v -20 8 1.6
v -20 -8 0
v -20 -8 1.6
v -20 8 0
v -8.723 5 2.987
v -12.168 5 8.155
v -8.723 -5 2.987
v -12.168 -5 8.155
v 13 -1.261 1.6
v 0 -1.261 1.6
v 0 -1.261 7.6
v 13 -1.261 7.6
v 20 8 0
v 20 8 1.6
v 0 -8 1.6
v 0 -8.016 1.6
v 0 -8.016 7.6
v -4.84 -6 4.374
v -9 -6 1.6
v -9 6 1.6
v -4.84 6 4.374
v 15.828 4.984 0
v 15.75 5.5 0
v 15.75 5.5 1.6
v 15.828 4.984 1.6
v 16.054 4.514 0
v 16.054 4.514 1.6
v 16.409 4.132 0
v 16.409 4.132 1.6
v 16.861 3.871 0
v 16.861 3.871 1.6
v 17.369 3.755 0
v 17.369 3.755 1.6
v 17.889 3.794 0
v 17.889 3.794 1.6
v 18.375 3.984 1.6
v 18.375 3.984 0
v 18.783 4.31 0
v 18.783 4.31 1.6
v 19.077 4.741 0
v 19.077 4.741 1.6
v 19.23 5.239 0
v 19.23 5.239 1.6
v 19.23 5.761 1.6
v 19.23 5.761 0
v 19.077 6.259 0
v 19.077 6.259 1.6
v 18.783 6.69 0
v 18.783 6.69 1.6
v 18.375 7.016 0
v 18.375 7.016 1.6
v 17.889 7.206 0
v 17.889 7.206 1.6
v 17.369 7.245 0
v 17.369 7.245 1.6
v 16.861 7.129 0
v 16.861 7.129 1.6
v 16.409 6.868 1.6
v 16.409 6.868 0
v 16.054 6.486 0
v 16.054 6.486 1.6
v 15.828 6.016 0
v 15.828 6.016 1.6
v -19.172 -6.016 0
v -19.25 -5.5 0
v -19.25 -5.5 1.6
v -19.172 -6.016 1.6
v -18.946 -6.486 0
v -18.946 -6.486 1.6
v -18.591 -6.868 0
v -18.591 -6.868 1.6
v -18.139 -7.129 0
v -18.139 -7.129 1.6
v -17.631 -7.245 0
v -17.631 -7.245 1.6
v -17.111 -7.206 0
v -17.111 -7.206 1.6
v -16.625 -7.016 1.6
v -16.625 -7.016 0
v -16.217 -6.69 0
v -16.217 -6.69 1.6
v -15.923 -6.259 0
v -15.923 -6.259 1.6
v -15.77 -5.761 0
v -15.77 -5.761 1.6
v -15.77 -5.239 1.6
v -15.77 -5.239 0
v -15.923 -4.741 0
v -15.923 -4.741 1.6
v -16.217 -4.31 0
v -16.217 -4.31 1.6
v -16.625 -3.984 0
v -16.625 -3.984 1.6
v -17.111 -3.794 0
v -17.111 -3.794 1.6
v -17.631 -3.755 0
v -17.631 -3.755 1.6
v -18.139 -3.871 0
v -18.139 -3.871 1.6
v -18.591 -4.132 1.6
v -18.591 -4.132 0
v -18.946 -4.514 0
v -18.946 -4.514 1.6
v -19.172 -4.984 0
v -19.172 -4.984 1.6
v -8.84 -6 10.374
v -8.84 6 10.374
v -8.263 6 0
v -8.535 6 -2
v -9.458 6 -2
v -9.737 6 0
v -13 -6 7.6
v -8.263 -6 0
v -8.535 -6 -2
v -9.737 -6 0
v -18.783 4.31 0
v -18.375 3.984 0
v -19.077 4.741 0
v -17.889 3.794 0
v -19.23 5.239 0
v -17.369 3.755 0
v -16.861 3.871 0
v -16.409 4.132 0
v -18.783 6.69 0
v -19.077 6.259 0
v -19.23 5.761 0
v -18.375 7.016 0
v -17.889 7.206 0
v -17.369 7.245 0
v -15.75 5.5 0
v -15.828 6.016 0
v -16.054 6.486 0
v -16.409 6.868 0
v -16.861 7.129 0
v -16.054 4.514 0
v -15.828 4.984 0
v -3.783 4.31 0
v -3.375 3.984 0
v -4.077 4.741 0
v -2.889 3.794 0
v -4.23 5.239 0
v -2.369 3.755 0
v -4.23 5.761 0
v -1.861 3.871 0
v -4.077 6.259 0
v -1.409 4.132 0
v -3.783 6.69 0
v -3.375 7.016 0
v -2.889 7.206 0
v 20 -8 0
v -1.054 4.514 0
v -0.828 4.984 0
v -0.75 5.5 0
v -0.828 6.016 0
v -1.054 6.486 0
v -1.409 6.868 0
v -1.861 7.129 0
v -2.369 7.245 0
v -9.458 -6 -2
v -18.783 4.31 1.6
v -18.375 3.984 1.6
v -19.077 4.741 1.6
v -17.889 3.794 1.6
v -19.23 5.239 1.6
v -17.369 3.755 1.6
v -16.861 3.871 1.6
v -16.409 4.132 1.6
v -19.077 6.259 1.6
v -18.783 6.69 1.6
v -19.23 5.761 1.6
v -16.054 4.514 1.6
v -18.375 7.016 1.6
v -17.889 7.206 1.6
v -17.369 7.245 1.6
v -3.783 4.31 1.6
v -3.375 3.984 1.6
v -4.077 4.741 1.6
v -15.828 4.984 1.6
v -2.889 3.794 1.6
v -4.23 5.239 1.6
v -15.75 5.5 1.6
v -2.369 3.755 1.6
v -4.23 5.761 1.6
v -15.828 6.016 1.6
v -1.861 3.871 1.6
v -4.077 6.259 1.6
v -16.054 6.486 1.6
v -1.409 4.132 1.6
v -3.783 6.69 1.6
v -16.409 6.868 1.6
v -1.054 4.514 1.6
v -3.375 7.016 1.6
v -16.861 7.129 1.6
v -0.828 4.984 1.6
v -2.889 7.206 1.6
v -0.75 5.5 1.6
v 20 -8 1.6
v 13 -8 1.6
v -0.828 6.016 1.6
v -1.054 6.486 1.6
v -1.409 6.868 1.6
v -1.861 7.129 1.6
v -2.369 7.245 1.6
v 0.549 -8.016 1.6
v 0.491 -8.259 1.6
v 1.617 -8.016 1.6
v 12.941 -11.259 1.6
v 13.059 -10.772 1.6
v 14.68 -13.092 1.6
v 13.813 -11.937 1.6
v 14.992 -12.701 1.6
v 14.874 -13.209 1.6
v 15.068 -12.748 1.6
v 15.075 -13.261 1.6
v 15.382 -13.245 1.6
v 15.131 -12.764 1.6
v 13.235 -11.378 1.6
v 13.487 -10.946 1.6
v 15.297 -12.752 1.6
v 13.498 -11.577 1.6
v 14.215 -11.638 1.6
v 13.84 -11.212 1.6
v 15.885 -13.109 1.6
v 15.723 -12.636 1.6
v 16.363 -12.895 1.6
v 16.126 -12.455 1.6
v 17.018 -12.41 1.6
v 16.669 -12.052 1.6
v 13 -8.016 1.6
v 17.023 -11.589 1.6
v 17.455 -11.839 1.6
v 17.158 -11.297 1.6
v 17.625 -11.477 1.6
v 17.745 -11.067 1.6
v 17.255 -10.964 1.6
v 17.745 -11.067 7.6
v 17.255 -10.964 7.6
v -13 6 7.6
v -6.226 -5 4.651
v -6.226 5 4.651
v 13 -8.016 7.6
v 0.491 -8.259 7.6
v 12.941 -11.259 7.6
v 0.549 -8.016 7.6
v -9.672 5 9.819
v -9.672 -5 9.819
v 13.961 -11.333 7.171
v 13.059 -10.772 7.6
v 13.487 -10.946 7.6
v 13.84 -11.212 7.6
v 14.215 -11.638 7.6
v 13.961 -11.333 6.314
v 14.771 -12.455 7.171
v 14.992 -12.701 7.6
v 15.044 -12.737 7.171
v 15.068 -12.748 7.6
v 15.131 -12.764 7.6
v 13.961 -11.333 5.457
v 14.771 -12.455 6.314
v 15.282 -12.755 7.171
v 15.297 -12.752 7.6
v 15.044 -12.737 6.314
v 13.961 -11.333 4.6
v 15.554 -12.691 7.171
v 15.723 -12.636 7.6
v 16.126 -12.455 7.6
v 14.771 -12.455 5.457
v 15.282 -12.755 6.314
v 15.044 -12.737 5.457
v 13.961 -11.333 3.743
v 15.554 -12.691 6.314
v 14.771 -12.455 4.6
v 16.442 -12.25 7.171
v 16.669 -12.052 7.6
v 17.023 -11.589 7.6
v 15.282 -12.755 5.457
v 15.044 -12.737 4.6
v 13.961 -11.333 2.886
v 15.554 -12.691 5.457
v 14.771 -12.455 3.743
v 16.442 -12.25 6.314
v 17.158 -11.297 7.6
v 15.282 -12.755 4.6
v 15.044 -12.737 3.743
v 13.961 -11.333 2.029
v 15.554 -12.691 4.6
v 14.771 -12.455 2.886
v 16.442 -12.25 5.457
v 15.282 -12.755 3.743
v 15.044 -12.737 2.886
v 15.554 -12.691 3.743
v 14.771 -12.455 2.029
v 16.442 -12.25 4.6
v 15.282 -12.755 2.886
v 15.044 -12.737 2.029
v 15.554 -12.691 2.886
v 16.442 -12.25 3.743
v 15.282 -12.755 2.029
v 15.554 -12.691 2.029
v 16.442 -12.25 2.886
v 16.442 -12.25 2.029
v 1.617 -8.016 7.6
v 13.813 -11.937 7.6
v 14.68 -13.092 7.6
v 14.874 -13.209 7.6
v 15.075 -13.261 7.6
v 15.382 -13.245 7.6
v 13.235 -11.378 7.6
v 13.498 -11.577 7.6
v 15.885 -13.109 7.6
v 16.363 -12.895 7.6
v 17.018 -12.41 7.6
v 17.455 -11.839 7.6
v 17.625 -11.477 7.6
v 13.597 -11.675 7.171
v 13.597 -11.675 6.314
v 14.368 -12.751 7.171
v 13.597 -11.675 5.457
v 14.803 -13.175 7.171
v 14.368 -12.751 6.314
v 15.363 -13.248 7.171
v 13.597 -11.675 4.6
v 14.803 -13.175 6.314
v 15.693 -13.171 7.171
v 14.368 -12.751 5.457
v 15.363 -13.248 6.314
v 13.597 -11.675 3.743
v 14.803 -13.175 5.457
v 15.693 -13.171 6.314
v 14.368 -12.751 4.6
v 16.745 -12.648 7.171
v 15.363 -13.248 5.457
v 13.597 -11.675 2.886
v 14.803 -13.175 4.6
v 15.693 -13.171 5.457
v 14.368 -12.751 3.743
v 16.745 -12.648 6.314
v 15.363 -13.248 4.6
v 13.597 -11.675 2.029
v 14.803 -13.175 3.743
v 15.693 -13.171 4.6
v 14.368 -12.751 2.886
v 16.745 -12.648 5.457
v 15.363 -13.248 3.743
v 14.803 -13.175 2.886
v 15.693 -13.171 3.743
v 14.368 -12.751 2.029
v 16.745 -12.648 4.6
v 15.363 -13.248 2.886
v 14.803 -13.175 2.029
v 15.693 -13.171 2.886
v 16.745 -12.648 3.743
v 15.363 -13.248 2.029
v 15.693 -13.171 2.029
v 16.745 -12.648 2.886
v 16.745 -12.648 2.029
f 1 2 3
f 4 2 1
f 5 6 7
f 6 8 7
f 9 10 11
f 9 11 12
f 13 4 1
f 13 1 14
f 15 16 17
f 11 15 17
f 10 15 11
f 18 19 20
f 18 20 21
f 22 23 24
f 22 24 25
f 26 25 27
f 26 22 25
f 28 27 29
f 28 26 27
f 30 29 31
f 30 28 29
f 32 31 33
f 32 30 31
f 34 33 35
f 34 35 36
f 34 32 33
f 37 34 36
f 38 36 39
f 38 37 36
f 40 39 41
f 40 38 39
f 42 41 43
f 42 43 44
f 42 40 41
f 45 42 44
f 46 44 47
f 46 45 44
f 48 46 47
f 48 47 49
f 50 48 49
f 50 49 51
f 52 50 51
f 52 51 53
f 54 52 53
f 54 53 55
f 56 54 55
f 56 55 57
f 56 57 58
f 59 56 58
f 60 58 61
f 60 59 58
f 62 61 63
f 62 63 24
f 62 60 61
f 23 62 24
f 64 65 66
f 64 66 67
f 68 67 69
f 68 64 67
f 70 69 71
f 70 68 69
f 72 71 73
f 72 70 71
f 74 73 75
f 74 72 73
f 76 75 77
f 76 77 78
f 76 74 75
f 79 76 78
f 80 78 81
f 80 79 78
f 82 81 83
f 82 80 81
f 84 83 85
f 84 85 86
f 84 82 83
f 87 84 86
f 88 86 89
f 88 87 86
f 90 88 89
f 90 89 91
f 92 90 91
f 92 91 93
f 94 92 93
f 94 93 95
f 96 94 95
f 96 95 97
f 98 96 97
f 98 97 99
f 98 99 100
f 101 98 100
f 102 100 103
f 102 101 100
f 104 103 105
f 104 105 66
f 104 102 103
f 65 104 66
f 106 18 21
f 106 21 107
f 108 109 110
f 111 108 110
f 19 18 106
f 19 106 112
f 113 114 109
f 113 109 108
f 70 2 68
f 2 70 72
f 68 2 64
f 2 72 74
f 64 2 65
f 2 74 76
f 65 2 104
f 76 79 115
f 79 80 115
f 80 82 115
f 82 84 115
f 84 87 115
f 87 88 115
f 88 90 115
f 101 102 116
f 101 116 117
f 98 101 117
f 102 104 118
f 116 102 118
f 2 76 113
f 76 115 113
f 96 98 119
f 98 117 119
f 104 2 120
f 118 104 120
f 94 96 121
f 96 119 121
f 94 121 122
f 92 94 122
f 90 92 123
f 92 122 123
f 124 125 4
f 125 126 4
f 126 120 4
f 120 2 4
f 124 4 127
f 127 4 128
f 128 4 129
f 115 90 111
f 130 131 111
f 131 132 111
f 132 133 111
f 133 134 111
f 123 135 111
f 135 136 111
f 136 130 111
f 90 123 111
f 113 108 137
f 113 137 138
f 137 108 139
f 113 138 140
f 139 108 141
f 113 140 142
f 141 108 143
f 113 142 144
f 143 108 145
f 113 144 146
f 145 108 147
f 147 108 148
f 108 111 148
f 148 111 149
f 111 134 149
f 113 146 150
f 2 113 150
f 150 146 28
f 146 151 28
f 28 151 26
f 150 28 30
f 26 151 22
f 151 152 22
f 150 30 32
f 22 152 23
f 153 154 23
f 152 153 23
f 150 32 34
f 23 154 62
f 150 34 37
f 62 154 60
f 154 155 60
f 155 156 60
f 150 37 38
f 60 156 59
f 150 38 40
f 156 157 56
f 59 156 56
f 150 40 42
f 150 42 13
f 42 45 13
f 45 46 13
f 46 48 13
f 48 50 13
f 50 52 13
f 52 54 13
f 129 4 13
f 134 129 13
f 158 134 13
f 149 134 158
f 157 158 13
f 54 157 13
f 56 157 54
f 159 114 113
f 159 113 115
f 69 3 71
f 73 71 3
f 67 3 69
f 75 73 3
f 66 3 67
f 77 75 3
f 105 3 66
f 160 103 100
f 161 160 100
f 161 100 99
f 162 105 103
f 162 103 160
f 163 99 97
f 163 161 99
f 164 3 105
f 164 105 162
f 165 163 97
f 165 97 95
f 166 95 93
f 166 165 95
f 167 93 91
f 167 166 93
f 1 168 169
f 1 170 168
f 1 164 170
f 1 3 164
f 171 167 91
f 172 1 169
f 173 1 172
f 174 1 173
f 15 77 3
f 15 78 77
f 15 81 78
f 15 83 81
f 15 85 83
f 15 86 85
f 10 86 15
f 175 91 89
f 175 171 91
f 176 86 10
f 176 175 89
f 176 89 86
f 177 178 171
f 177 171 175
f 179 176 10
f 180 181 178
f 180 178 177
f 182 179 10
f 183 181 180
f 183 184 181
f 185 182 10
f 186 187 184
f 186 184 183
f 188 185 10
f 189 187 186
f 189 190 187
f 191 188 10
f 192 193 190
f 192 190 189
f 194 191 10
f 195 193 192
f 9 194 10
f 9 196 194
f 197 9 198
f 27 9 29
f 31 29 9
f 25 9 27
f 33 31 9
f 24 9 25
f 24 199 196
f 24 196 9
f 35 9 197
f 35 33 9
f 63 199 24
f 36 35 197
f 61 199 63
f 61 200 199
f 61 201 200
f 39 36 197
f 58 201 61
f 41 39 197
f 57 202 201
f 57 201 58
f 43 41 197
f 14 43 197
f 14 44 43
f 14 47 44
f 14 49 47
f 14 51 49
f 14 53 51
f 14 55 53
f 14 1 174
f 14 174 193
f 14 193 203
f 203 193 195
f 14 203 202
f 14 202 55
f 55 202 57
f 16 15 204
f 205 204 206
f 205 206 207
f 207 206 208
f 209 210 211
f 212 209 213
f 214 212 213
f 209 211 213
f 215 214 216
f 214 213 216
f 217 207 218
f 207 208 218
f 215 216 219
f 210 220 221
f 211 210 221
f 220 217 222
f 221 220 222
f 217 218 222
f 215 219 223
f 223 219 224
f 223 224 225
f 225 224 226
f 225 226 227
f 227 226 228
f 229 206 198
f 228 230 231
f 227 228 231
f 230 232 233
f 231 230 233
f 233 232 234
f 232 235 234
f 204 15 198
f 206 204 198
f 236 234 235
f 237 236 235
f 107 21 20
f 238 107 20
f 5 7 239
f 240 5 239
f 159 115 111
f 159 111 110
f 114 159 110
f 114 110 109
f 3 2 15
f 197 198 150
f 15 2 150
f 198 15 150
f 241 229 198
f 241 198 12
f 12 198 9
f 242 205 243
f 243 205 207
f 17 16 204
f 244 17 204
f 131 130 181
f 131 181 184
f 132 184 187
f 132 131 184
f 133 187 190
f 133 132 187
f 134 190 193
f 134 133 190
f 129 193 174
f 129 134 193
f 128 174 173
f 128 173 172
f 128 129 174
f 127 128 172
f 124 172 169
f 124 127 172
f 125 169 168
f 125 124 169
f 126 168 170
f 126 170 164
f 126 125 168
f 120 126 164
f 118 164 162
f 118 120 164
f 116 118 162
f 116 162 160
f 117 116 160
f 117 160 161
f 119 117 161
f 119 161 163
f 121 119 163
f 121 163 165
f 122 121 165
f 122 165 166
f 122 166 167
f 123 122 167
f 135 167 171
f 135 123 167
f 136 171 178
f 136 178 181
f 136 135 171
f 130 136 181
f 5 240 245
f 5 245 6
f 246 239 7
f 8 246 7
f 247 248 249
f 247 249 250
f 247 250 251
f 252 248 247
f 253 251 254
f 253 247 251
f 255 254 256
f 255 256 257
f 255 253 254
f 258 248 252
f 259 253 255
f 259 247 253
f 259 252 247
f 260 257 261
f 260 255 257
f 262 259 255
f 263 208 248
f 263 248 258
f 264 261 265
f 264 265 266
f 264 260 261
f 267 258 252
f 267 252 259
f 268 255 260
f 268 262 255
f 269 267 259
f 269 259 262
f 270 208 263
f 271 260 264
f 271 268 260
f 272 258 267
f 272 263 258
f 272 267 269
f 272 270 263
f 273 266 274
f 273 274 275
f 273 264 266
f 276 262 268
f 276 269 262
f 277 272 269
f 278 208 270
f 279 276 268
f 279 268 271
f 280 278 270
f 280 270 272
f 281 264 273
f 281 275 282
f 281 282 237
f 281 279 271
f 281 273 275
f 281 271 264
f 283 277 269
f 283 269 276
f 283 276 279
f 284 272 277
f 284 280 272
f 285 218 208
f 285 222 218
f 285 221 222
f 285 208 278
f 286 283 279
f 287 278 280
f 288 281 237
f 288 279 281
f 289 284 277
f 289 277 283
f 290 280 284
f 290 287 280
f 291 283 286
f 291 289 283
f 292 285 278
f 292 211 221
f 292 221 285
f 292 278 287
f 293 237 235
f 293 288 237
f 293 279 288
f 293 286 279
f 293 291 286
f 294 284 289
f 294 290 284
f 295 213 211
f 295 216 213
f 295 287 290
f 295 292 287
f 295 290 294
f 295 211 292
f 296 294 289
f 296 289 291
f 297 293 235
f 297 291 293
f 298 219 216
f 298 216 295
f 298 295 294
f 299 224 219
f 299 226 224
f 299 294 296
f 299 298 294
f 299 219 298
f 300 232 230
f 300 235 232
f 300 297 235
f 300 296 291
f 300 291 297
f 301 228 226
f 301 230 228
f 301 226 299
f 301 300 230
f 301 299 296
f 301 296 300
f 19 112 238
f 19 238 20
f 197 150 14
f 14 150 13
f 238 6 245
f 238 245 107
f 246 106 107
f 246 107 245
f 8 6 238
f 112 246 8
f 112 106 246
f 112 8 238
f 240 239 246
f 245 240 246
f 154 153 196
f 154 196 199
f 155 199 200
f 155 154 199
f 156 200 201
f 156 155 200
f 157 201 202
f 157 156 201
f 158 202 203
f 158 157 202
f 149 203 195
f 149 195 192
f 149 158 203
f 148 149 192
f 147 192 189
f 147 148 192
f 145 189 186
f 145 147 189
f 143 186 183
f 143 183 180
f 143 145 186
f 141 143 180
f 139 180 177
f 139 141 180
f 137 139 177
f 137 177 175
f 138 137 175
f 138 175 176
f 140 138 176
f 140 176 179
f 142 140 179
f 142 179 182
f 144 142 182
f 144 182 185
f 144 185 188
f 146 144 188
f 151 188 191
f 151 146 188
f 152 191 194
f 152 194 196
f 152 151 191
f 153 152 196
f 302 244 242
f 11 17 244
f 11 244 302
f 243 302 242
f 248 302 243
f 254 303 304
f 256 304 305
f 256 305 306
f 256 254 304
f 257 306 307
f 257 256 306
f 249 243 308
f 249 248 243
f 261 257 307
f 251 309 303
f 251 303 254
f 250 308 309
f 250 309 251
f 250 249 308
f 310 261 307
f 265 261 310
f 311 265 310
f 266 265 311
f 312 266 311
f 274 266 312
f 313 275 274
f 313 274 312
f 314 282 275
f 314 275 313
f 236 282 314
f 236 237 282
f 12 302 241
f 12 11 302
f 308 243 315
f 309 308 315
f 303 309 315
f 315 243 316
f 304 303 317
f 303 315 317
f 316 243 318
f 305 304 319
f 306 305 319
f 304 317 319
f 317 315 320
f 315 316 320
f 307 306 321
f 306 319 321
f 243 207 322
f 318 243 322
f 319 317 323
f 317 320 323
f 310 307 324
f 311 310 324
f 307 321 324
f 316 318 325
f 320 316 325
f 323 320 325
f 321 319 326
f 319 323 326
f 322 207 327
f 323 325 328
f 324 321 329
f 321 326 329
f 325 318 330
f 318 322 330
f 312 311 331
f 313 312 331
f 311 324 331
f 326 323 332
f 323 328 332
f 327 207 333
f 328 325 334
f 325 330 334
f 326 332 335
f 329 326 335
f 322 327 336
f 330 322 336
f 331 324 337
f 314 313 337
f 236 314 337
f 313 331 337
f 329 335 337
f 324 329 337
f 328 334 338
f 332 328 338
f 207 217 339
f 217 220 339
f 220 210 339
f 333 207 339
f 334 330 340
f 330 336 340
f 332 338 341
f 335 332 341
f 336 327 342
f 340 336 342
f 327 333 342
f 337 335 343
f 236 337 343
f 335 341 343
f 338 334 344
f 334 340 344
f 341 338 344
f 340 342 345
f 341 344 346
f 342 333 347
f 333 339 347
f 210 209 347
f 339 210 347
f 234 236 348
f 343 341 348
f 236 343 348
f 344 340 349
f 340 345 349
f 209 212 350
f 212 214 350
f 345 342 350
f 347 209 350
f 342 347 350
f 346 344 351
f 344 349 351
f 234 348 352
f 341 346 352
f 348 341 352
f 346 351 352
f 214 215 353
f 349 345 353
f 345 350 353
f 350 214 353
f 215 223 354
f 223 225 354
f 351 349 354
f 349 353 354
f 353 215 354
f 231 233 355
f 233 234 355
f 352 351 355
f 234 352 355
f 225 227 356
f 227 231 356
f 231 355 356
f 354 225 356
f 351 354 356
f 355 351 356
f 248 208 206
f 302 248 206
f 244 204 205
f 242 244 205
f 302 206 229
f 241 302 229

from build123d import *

# Parameters (mm, degrees)
SKETCH1_W           = 40
SKETCH1_H           = 16
SKETCH1_R           = 1.75
EXTRUDE1_DEPTH      = 1.6
SKETCH2_W           = 13
SKETCH2_H           = 6.754142386
EXTRUDE2_DEPTH      = 6
EXTRUDE_THIN1_START = -6
EXTRUDE_THIN1_DEPTH = 6
EXTRUDE3_DEPTH      = 6
EXTRUDE3_DEPTH_BACK = 6
SHELL1_T            = -1
EXTRUDE4_DEPTH      = 6
EXTRUDE4_DEPTH_BACK = 6


# Read off the part's stored shape, not the designer's step: Extrude-Thin1
with BuildPart() as part:
    # Sketch1 → Extrude1 (new body)
    with BuildSketch(Plane.XY):
        Rectangle(SKETCH1_W, SKETCH1_H)
        with Locations((-17.5, 5.5)):
            Circle(SKETCH1_R, mode=Mode.SUBTRACT)
        with Locations(Location((17.5, 5.5, 0), (0, 0, 180))):
            Circle(SKETCH1_R, mode=Mode.SUBTRACT)
        with Locations(Location((-17.5, -5.5, 0), (0, 0, 180))):
            Circle(SKETCH1_R, mode=Mode.SUBTRACT)
        with Locations((-2.5, 5.5)):
            Circle(SKETCH1_R, mode=Mode.SUBTRACT)
    extrude(amount=EXTRUDE1_DEPTH)

    # Sketch2 → Extrude2 (add)
    with BuildSketch(Plane.XY.offset(1.6)):
        with Locations((6.5, -4.638460583)):
            Rectangle(SKETCH2_W, SKETCH2_H)
    extrude(amount=EXTRUDE2_DEPTH)

    # Extrude-Thin1 outline → Extrude-Thin1 (add)
    with BuildSketch(Plane.XY.offset(7.6).offset(EXTRUDE_THIN1_START)):
        with BuildLine():
            Line((0.490840728, -8.25857598), (12.941437941, -11.25857598))
            add(Edge.make_bspline(
                [(12.941437941, -11.25857598), (13.067291507, -11.288900686), (13.181236211, -11.340967983), (13.397694142, -11.482359101), (13.49974484, -11.572007401), (13.790224047, -11.88131409), (13.96083617, -12.140688181), (14.20539816, -12.515236753), (14.285250733, -12.637639815), (14.451465801, -12.86408748), (14.537302747, -12.968584339), (14.688083246, -13.101089197), (14.742296743, -13.141233409), (14.862841146, -13.207776058), (14.930449466, -13.233266141), (15.127211291, -13.276318978), (15.250520499, -13.266569443), (15.418638539, -13.238985632), (15.471653276, -13.227738224), (15.58084969, -13.202236421), (15.636575352, -13.187706268), (15.806360125, -13.138466747), (15.923036621, -13.098113207), (16.276883006, -12.95177033), (16.518060705, -12.820511607), (16.971431108, -12.474902809), (17.183616041, -12.260202761), (17.532538565, -11.735362691), (17.66867522, -11.425299122), (17.744563111, -11.067386233)],
                knots=[0, 0, 0, 0, 0.0625, 0.0625, 0.125, 0.125, 0.25, 0.25, 0.3125, 0.3125, 0.375, 0.375, 0.40625, 0.40625, 0.4375, 0.4375, 0.5, 0.5, 0.53125, 0.53125, 0.5625, 0.5625, 0.625, 0.625, 0.75, 0.75, 0.875, 0.875, 1, 1, 1, 1], degree=3))
            Line((17.744563111, -11.067386233), (17.255436889, -10.963677318))
            add(Edge.make_bspline(
                [(13.058562059, -10.772487571), (13.245229843, -10.817465603), (13.41346766, -10.895444904), (13.712335202, -11.090666284), (13.843427458, -11.207583885), (14.196274895, -11.583301215), (14.379744249, -11.867711564), (14.62392859, -12.241681764), (14.699928814, -12.357591978), (14.842932135, -12.55241648), (14.910460781, -12.630878513), (14.996591837, -12.706569889), (15.022492719, -12.724784071), (15.065919556, -12.748756455), (15.082254893, -12.754653028), (15.144225267, -12.768212571), (15.202364037, -12.767785289), (15.321284852, -12.748273466), (15.366494295, -12.73884283), (15.458587584, -12.717335302), (15.505822811, -12.705023793), (15.650063368, -12.663192386), (15.74959397, -12.628770712), (16.050495881, -12.504324474), (16.253986383, -12.393105821), (16.629258319, -12.107032266), (16.801047526, -11.932527336), (17.082346492, -11.509404841), (17.192457189, -11.260710823), (17.255436889, -10.963677318)],
                knots=[0, 0, 0, 0, 0.0625, 0.0625, 0.125, 0.125, 0.25, 0.25, 0.3125, 0.3125, 0.375, 0.375, 0.40625, 0.40625, 0.4375, 0.4375, 0.5, 0.5, 0.53125, 0.53125, 0.5625, 0.5625, 0.625, 0.625, 0.75, 0.75, 0.875, 0.875, 1, 1, 1, 1], degree=3))
            Line((13.058562059, -10.772487571), (1.616646677, -8.015531776))
            Line((1.616646677, -8.015531776), (0.549402787, -8.015531776))
            Line((0.549402787, -8.015531776), (0.490840728, -8.25857598))
        make_face()
    extrude(amount=EXTRUDE_THIN1_DEPTH)

    # Sketch5 → Extrude4 (add, two sides: drawn at the far end of the back side and taken through both)
    with BuildSketch(Plane(origin=(0, 0, 0), x_dir=(1, 0, 0), z_dir=(0, 1, 0)).offset(-EXTRUDE4_DEPTH_BACK)):
        Polygon((-9.736964899, 0), (-9.458111879, 2), (-8.535084126, 2), (-8.263035101, 0), align=None)
    extrude(amount=EXTRUDE4_DEPTH + EXTRUDE4_DEPTH_BACK)


with BuildPart() as body_2:
    # Sketch4 → Extrude3 (new, two sides: drawn at the far end of the back side and taken through both)
    with BuildSketch(Plane(origin=(0, 0, 0), x_dir=(1, 0, 0), z_dir=(0, 1, 0)).offset(-EXTRUDE3_DEPTH_BACK)):
        Polygon((-13, -7.6), (-9, -1.6), (-4.839748528, -4.373500981), (-8.839748528, -10.373500981), align=None)
    extrude(amount=EXTRUDE3_DEPTH + EXTRUDE3_DEPTH_BACK)

    # Shell1
    shell1_openings = [body_2.faces().sort_by_distance(p)[0] for p in [
        (-10.919874264, 0, 8.986750491),
    ]]
    offset(amount=SHELL1_T, openings=shell1_openings, kind=Kind.INTERSECTION)


solid = Compound([part.part, body_2.part])
